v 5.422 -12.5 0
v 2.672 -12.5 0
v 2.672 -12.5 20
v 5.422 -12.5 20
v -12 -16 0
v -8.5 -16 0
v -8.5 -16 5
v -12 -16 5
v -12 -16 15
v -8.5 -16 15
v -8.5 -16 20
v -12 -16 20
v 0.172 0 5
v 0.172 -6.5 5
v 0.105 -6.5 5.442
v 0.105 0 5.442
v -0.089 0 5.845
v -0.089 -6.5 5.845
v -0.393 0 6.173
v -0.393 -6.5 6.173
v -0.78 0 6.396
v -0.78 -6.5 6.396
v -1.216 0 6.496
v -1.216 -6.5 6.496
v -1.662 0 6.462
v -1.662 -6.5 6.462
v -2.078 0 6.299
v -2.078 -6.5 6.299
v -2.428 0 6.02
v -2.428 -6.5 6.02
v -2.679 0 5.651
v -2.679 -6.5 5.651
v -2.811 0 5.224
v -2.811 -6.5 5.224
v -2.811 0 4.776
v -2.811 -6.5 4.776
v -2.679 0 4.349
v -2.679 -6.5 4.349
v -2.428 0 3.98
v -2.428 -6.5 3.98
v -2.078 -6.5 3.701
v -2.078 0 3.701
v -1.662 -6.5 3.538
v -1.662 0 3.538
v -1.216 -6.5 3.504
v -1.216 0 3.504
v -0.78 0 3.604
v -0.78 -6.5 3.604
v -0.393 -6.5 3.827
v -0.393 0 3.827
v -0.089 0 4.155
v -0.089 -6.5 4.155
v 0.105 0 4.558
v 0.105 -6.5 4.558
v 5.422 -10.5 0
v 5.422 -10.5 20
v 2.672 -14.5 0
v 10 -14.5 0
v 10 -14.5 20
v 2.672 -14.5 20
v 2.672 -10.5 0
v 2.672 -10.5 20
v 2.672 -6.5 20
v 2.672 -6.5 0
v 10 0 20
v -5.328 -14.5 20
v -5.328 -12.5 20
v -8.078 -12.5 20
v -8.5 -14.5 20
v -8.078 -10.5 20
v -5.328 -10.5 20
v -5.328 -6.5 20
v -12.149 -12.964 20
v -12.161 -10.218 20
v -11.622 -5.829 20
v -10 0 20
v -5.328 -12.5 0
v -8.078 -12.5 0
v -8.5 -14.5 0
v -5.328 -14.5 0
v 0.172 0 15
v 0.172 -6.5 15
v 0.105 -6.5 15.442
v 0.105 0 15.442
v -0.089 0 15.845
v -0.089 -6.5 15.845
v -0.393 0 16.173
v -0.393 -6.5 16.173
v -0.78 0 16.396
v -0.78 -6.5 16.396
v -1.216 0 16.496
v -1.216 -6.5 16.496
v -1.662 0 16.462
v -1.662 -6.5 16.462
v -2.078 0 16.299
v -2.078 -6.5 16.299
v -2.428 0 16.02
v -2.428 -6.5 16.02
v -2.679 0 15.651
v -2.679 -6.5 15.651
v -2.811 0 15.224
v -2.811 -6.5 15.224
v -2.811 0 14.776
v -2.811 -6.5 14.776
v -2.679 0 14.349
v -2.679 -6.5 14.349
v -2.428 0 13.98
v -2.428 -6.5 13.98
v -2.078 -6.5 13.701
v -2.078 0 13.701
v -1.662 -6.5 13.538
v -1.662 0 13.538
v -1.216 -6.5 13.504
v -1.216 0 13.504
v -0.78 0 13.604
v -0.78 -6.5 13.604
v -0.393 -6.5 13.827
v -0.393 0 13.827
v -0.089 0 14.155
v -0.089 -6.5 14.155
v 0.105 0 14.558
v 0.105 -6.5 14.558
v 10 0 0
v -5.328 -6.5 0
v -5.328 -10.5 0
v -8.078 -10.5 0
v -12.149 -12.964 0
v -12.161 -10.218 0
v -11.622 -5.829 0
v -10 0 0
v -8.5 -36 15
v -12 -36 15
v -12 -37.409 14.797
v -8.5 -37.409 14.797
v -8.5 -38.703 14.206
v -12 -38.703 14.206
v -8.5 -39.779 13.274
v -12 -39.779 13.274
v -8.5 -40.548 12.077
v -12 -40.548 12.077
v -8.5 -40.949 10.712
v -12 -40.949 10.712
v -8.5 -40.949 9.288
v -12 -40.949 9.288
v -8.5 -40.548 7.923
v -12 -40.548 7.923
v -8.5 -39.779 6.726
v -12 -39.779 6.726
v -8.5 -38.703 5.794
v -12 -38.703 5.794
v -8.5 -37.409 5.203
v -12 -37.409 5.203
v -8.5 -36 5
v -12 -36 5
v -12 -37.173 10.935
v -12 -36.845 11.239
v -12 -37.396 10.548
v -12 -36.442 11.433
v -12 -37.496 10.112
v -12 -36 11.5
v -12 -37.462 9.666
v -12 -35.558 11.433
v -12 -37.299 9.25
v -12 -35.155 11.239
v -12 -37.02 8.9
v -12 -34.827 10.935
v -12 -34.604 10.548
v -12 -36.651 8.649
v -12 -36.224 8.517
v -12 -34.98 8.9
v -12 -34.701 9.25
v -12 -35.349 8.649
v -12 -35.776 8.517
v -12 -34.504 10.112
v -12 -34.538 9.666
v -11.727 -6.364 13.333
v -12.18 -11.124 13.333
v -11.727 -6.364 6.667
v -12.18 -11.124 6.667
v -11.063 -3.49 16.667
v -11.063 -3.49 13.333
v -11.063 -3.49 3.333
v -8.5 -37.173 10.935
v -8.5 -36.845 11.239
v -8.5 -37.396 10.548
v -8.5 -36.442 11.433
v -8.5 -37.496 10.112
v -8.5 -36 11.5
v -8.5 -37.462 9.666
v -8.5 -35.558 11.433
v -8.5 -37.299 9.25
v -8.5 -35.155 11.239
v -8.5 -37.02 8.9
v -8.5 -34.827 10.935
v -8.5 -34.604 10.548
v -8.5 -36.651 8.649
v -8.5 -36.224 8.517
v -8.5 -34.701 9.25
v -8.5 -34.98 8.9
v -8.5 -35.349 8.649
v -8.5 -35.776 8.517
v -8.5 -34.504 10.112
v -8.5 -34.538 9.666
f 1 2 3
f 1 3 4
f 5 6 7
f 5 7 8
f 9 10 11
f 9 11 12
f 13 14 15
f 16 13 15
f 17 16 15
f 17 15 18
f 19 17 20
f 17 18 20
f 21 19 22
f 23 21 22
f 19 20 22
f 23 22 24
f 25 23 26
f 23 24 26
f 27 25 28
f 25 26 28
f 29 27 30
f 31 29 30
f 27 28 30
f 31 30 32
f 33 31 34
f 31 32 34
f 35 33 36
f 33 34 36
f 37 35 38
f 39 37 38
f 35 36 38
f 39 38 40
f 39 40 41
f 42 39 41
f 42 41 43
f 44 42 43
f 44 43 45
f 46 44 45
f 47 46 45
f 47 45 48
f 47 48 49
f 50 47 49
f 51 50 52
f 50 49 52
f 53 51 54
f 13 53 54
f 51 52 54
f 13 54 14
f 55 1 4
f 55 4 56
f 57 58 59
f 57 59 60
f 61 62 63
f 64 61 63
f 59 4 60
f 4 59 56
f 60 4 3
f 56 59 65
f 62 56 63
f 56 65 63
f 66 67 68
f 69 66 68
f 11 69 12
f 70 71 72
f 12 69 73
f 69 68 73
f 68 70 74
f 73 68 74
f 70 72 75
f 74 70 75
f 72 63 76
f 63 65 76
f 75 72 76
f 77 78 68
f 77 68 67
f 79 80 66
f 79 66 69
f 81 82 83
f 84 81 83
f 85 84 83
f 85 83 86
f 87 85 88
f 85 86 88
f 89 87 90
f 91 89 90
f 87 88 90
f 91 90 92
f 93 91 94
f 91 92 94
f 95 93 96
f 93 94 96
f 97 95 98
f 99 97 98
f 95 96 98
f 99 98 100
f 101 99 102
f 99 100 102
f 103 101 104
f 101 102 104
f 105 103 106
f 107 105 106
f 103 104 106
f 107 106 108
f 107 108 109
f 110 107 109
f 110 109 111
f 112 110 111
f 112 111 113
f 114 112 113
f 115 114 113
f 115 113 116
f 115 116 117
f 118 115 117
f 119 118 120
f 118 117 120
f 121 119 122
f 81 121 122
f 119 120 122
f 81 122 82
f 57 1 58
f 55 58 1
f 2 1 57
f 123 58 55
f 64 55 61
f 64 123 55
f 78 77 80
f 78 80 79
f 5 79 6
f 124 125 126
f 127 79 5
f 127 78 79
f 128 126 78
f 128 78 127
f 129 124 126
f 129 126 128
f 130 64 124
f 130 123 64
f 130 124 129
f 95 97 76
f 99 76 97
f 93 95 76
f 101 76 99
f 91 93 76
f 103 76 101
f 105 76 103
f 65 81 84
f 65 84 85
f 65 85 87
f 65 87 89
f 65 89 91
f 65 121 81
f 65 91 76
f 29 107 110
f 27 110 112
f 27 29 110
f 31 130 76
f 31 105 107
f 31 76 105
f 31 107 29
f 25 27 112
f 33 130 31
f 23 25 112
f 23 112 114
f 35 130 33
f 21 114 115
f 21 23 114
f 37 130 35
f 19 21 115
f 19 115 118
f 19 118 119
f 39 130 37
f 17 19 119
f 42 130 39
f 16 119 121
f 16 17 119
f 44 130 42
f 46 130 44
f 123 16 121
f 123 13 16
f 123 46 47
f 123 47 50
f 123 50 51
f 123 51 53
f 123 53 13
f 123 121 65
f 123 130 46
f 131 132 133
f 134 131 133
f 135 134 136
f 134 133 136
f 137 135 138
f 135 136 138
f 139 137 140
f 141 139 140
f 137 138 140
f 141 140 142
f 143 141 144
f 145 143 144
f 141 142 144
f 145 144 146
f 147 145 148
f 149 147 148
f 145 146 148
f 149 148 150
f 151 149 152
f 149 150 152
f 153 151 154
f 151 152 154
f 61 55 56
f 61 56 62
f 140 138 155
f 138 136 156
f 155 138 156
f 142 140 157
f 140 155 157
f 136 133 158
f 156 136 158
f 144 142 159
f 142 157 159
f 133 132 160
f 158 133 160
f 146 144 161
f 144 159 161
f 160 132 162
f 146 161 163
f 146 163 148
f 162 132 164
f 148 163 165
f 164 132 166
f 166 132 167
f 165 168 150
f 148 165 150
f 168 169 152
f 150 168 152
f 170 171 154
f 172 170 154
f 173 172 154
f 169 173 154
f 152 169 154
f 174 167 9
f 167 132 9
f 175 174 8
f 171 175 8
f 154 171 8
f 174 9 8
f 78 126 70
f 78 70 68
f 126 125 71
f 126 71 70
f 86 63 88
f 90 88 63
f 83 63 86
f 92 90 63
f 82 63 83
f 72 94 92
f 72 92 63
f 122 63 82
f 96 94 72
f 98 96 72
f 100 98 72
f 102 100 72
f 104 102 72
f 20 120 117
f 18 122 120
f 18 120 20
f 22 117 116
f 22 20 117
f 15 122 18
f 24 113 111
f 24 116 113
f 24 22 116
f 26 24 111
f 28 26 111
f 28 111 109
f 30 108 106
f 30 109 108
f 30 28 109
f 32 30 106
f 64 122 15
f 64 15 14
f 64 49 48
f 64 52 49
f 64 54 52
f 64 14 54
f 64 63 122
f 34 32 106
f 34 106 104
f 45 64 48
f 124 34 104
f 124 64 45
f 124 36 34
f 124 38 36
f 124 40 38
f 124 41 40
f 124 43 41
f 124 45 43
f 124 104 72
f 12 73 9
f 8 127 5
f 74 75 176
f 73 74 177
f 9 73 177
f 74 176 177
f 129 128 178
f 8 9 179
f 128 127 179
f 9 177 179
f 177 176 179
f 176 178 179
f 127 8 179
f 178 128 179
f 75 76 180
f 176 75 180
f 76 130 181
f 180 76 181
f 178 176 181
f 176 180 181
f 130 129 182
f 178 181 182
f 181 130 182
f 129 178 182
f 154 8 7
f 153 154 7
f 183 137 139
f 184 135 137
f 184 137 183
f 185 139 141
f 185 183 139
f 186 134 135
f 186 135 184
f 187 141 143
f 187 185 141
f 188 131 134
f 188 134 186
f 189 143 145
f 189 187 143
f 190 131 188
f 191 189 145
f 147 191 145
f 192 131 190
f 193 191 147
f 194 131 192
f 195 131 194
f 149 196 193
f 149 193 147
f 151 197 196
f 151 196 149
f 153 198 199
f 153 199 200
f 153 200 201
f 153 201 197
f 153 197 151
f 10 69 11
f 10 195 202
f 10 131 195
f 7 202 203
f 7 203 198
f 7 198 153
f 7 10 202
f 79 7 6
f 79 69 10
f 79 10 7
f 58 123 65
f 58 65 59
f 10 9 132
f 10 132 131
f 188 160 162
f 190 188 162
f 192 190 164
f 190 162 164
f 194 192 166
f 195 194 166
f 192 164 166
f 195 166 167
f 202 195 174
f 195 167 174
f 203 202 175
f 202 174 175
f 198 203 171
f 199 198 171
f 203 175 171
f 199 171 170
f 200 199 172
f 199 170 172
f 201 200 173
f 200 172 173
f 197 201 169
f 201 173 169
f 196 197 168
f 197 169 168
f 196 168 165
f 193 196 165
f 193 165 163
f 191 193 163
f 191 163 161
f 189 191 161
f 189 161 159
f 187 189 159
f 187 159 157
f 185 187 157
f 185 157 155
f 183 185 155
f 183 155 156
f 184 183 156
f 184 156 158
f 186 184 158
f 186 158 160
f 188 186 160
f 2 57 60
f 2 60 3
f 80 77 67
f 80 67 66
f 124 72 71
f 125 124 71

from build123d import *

# Parameters (mm, degrees)
BOSS_EXTRUDE1_DEPTH = 20
SKETCH2_R           = 1.5
CUT_EXTRUDE1_DEPTH  = 6.5
SKETCH4_W           = 3.5
SKETCH4_H           = 10
BOSS_EXTRUDE2_DEPTH = 20
BOSS_EXTRUDE3_DEPTH = 3.5
SKETCH6_R           = 1.5
CUT_EXTRUDE2_DEPTH  = 20


with BuildPart() as part:
    # Sketch1 → Boss-Extrude1 (new body)
    with BuildSketch(Plane.XY):
        with BuildLine():
            Line((-10, 0), (10, 0))
            Line((10, 0), (10, -14.5))
            Line((10, -14.5), (2.672015421, -14.5))
            Line((2.672015421, -14.5), (2.672015421, -12.5))
            Line((2.672015421, -12.5), (5.422015421, -12.5))
            Line((5.422015421, -12.5), (5.422015421, -10.5))
            Line((5.422015421, -10.5), (2.672015421, -10.5))
            Line((2.672015421, -10.5), (2.672015421, -6.5))
            Line((2.672015421, -6.5), (-5.327984579, -6.5))
            Line((-5.327984579, -6.5), (-5.327984579, -10.5))
            Line((-5.327984579, -10.5), (-8.077984579, -10.5))
            Line((-8.077984579, -10.5), (-8.077984579, -12.5))
            Line((-8.077984579, -12.5), (-5.327984579, -12.5))
            Line((-5.327984579, -12.5), (-5.327984579, -14.5))
            Line((-5.327984579, -14.5), (-8.5, -14.5))
            Line((-8.5, -14.5), (-8.5, -16))
            Line((-8.5, -16), (-12, -16))
            add(Edge.make_bspline(
                [(-10, 0), (-12.576646285, -7.740566288), (-12.284280687, -10.492382976), (-12, -16)],
                knots=[0, 0, 0, 0, 1, 1, 1, 1], degree=3))
        make_face()
    extrude(amount=BOSS_EXTRUDE1_DEPTH)

    # Sketch2 → Cut-Extrude1 (cut)
    with BuildSketch(Plane.XZ.offset(6.5)):
        with Locations((-1.327984579, 15)):
            Circle(SKETCH2_R)
        with Locations((-1.327984579, 5)):
            Circle(SKETCH2_R)
    extrude(amount=-CUT_EXTRUDE1_DEPTH, mode=Mode.SUBTRACT)

    # Sketch4 → Boss-Extrude2 (add)
    with BuildSketch(Plane.XZ.offset(16)):
        with Locations((-10.25, 10)):
            Rectangle(SKETCH4_W, SKETCH4_H)
    extrude(amount=BOSS_EXTRUDE2_DEPTH)

    # Sketch5 → Boss-Extrude3 (add)
    with BuildSketch(Plane.ZY.offset(12)):
        with BuildLine():
            Line((5, -36), (15, -36))
            ThreePointArc((15, -36), (10, -41), (5, -36))
        make_face()
    extrude(amount=-BOSS_EXTRUDE3_DEPTH)

    # Sketch6 → Cut-Extrude2 (cut)
    with BuildSketch(Plane.ZY.offset(12)):
        with Locations((10, -36)):
            Circle(SKETCH6_R)
    extrude(amount=-CUT_EXTRUDE2_DEPTH, mode=Mode.SUBTRACT)


solid = part.part
